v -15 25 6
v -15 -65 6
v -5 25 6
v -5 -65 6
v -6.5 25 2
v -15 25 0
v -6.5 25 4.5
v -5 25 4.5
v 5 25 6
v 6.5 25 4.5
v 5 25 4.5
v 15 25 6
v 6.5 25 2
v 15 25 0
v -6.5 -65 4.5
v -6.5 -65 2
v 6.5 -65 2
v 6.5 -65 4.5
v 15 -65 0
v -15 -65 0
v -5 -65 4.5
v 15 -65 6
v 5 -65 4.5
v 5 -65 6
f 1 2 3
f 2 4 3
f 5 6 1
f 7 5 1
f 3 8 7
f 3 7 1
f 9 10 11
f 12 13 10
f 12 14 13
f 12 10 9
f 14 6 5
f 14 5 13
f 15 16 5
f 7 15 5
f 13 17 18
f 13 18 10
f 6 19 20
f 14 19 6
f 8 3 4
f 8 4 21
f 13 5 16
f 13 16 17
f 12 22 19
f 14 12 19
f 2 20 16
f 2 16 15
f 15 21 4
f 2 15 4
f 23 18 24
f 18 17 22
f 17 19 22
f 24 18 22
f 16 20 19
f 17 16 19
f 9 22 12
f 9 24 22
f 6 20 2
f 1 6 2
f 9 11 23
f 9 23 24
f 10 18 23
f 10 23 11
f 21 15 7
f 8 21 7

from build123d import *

# Parameters (mm, degrees)
SKETCH1_W           = 16
SKETCH1_H           = 90
BOSS_EXTRUDE1_DEPTH = 2
SKETCH2_W           = 1.5
SKETCH2_H           = 90
BOSS_EXTRUDE2_DEPTH = 4
SKETCH3_W           = 1.5
SKETCH3_H           = 90
BOSS_EXTRUDE3_DEPTH = 1.5
SKETCH4_W           = 1.5
SKETCH4_H           = 90
BOSS_EXTRUDE4_DEPTH = 1.5
SKETCH6_W           = 6
SKETCH6_H           = 90
BOSS_EXTRUDE5_DEPTH = 7
SKETCH7_W           = 6
SKETCH7_H           = 90
BOSS_EXTRUDE6_DEPTH = 7


with BuildPart() as part:
    # Sketch1 → Boss-Extrude1 (new body)
    with BuildSketch(Plane.XY):
        with Locations((0, -20)):
            Rectangle(SKETCH1_W, SKETCH1_H)
    extrude(amount=BOSS_EXTRUDE1_DEPTH)

    # Sketch2 → Boss-Extrude2 (add)
    with BuildSketch(Plane.XY.offset(2)):
        with Locations((-7.25, -20)):
            Rectangle(SKETCH2_W, SKETCH2_H)
        with Locations((7.25, -20)):
            Rectangle(SKETCH2_W, SKETCH2_H)
    extrude(amount=BOSS_EXTRUDE2_DEPTH)

    # Sketch3 → Boss-Extrude3 (add)
    with BuildSketch(Plane(origin=(-6.5, 0, 0), x_dir=(0, 0, -1), z_dir=(1, 0, 0))):
        with Locations((-5.25, -20)):
            Rectangle(SKETCH3_W, SKETCH3_H)
    extrude(amount=BOSS_EXTRUDE3_DEPTH)

    # Sketch4 → Boss-Extrude4 (add)
    with BuildSketch(Plane.ZY.offset(-6.5)):
        with Locations((5.25, -20)):
            Rectangle(SKETCH4_W, SKETCH4_H)
    extrude(amount=BOSS_EXTRUDE4_DEPTH)

    # Sketch6 → Boss-Extrude5 (add)
    with BuildSketch(Plane(origin=(8, 0, 0), x_dir=(0, 0, -1), z_dir=(1, 0, 0))):
        with Locations((-3, -20)):
            Rectangle(SKETCH6_W, SKETCH6_H)
    extrude(amount=BOSS_EXTRUDE5_DEPTH)

    # Sketch7 → Boss-Extrude6 (add)
    with BuildSketch(Plane.ZY.offset(8)):
        with Locations((3, -20)):
            Rectangle(SKETCH7_W, SKETCH7_H)
    extrude(amount=BOSS_EXTRUDE6_DEPTH)


solid = part.part
